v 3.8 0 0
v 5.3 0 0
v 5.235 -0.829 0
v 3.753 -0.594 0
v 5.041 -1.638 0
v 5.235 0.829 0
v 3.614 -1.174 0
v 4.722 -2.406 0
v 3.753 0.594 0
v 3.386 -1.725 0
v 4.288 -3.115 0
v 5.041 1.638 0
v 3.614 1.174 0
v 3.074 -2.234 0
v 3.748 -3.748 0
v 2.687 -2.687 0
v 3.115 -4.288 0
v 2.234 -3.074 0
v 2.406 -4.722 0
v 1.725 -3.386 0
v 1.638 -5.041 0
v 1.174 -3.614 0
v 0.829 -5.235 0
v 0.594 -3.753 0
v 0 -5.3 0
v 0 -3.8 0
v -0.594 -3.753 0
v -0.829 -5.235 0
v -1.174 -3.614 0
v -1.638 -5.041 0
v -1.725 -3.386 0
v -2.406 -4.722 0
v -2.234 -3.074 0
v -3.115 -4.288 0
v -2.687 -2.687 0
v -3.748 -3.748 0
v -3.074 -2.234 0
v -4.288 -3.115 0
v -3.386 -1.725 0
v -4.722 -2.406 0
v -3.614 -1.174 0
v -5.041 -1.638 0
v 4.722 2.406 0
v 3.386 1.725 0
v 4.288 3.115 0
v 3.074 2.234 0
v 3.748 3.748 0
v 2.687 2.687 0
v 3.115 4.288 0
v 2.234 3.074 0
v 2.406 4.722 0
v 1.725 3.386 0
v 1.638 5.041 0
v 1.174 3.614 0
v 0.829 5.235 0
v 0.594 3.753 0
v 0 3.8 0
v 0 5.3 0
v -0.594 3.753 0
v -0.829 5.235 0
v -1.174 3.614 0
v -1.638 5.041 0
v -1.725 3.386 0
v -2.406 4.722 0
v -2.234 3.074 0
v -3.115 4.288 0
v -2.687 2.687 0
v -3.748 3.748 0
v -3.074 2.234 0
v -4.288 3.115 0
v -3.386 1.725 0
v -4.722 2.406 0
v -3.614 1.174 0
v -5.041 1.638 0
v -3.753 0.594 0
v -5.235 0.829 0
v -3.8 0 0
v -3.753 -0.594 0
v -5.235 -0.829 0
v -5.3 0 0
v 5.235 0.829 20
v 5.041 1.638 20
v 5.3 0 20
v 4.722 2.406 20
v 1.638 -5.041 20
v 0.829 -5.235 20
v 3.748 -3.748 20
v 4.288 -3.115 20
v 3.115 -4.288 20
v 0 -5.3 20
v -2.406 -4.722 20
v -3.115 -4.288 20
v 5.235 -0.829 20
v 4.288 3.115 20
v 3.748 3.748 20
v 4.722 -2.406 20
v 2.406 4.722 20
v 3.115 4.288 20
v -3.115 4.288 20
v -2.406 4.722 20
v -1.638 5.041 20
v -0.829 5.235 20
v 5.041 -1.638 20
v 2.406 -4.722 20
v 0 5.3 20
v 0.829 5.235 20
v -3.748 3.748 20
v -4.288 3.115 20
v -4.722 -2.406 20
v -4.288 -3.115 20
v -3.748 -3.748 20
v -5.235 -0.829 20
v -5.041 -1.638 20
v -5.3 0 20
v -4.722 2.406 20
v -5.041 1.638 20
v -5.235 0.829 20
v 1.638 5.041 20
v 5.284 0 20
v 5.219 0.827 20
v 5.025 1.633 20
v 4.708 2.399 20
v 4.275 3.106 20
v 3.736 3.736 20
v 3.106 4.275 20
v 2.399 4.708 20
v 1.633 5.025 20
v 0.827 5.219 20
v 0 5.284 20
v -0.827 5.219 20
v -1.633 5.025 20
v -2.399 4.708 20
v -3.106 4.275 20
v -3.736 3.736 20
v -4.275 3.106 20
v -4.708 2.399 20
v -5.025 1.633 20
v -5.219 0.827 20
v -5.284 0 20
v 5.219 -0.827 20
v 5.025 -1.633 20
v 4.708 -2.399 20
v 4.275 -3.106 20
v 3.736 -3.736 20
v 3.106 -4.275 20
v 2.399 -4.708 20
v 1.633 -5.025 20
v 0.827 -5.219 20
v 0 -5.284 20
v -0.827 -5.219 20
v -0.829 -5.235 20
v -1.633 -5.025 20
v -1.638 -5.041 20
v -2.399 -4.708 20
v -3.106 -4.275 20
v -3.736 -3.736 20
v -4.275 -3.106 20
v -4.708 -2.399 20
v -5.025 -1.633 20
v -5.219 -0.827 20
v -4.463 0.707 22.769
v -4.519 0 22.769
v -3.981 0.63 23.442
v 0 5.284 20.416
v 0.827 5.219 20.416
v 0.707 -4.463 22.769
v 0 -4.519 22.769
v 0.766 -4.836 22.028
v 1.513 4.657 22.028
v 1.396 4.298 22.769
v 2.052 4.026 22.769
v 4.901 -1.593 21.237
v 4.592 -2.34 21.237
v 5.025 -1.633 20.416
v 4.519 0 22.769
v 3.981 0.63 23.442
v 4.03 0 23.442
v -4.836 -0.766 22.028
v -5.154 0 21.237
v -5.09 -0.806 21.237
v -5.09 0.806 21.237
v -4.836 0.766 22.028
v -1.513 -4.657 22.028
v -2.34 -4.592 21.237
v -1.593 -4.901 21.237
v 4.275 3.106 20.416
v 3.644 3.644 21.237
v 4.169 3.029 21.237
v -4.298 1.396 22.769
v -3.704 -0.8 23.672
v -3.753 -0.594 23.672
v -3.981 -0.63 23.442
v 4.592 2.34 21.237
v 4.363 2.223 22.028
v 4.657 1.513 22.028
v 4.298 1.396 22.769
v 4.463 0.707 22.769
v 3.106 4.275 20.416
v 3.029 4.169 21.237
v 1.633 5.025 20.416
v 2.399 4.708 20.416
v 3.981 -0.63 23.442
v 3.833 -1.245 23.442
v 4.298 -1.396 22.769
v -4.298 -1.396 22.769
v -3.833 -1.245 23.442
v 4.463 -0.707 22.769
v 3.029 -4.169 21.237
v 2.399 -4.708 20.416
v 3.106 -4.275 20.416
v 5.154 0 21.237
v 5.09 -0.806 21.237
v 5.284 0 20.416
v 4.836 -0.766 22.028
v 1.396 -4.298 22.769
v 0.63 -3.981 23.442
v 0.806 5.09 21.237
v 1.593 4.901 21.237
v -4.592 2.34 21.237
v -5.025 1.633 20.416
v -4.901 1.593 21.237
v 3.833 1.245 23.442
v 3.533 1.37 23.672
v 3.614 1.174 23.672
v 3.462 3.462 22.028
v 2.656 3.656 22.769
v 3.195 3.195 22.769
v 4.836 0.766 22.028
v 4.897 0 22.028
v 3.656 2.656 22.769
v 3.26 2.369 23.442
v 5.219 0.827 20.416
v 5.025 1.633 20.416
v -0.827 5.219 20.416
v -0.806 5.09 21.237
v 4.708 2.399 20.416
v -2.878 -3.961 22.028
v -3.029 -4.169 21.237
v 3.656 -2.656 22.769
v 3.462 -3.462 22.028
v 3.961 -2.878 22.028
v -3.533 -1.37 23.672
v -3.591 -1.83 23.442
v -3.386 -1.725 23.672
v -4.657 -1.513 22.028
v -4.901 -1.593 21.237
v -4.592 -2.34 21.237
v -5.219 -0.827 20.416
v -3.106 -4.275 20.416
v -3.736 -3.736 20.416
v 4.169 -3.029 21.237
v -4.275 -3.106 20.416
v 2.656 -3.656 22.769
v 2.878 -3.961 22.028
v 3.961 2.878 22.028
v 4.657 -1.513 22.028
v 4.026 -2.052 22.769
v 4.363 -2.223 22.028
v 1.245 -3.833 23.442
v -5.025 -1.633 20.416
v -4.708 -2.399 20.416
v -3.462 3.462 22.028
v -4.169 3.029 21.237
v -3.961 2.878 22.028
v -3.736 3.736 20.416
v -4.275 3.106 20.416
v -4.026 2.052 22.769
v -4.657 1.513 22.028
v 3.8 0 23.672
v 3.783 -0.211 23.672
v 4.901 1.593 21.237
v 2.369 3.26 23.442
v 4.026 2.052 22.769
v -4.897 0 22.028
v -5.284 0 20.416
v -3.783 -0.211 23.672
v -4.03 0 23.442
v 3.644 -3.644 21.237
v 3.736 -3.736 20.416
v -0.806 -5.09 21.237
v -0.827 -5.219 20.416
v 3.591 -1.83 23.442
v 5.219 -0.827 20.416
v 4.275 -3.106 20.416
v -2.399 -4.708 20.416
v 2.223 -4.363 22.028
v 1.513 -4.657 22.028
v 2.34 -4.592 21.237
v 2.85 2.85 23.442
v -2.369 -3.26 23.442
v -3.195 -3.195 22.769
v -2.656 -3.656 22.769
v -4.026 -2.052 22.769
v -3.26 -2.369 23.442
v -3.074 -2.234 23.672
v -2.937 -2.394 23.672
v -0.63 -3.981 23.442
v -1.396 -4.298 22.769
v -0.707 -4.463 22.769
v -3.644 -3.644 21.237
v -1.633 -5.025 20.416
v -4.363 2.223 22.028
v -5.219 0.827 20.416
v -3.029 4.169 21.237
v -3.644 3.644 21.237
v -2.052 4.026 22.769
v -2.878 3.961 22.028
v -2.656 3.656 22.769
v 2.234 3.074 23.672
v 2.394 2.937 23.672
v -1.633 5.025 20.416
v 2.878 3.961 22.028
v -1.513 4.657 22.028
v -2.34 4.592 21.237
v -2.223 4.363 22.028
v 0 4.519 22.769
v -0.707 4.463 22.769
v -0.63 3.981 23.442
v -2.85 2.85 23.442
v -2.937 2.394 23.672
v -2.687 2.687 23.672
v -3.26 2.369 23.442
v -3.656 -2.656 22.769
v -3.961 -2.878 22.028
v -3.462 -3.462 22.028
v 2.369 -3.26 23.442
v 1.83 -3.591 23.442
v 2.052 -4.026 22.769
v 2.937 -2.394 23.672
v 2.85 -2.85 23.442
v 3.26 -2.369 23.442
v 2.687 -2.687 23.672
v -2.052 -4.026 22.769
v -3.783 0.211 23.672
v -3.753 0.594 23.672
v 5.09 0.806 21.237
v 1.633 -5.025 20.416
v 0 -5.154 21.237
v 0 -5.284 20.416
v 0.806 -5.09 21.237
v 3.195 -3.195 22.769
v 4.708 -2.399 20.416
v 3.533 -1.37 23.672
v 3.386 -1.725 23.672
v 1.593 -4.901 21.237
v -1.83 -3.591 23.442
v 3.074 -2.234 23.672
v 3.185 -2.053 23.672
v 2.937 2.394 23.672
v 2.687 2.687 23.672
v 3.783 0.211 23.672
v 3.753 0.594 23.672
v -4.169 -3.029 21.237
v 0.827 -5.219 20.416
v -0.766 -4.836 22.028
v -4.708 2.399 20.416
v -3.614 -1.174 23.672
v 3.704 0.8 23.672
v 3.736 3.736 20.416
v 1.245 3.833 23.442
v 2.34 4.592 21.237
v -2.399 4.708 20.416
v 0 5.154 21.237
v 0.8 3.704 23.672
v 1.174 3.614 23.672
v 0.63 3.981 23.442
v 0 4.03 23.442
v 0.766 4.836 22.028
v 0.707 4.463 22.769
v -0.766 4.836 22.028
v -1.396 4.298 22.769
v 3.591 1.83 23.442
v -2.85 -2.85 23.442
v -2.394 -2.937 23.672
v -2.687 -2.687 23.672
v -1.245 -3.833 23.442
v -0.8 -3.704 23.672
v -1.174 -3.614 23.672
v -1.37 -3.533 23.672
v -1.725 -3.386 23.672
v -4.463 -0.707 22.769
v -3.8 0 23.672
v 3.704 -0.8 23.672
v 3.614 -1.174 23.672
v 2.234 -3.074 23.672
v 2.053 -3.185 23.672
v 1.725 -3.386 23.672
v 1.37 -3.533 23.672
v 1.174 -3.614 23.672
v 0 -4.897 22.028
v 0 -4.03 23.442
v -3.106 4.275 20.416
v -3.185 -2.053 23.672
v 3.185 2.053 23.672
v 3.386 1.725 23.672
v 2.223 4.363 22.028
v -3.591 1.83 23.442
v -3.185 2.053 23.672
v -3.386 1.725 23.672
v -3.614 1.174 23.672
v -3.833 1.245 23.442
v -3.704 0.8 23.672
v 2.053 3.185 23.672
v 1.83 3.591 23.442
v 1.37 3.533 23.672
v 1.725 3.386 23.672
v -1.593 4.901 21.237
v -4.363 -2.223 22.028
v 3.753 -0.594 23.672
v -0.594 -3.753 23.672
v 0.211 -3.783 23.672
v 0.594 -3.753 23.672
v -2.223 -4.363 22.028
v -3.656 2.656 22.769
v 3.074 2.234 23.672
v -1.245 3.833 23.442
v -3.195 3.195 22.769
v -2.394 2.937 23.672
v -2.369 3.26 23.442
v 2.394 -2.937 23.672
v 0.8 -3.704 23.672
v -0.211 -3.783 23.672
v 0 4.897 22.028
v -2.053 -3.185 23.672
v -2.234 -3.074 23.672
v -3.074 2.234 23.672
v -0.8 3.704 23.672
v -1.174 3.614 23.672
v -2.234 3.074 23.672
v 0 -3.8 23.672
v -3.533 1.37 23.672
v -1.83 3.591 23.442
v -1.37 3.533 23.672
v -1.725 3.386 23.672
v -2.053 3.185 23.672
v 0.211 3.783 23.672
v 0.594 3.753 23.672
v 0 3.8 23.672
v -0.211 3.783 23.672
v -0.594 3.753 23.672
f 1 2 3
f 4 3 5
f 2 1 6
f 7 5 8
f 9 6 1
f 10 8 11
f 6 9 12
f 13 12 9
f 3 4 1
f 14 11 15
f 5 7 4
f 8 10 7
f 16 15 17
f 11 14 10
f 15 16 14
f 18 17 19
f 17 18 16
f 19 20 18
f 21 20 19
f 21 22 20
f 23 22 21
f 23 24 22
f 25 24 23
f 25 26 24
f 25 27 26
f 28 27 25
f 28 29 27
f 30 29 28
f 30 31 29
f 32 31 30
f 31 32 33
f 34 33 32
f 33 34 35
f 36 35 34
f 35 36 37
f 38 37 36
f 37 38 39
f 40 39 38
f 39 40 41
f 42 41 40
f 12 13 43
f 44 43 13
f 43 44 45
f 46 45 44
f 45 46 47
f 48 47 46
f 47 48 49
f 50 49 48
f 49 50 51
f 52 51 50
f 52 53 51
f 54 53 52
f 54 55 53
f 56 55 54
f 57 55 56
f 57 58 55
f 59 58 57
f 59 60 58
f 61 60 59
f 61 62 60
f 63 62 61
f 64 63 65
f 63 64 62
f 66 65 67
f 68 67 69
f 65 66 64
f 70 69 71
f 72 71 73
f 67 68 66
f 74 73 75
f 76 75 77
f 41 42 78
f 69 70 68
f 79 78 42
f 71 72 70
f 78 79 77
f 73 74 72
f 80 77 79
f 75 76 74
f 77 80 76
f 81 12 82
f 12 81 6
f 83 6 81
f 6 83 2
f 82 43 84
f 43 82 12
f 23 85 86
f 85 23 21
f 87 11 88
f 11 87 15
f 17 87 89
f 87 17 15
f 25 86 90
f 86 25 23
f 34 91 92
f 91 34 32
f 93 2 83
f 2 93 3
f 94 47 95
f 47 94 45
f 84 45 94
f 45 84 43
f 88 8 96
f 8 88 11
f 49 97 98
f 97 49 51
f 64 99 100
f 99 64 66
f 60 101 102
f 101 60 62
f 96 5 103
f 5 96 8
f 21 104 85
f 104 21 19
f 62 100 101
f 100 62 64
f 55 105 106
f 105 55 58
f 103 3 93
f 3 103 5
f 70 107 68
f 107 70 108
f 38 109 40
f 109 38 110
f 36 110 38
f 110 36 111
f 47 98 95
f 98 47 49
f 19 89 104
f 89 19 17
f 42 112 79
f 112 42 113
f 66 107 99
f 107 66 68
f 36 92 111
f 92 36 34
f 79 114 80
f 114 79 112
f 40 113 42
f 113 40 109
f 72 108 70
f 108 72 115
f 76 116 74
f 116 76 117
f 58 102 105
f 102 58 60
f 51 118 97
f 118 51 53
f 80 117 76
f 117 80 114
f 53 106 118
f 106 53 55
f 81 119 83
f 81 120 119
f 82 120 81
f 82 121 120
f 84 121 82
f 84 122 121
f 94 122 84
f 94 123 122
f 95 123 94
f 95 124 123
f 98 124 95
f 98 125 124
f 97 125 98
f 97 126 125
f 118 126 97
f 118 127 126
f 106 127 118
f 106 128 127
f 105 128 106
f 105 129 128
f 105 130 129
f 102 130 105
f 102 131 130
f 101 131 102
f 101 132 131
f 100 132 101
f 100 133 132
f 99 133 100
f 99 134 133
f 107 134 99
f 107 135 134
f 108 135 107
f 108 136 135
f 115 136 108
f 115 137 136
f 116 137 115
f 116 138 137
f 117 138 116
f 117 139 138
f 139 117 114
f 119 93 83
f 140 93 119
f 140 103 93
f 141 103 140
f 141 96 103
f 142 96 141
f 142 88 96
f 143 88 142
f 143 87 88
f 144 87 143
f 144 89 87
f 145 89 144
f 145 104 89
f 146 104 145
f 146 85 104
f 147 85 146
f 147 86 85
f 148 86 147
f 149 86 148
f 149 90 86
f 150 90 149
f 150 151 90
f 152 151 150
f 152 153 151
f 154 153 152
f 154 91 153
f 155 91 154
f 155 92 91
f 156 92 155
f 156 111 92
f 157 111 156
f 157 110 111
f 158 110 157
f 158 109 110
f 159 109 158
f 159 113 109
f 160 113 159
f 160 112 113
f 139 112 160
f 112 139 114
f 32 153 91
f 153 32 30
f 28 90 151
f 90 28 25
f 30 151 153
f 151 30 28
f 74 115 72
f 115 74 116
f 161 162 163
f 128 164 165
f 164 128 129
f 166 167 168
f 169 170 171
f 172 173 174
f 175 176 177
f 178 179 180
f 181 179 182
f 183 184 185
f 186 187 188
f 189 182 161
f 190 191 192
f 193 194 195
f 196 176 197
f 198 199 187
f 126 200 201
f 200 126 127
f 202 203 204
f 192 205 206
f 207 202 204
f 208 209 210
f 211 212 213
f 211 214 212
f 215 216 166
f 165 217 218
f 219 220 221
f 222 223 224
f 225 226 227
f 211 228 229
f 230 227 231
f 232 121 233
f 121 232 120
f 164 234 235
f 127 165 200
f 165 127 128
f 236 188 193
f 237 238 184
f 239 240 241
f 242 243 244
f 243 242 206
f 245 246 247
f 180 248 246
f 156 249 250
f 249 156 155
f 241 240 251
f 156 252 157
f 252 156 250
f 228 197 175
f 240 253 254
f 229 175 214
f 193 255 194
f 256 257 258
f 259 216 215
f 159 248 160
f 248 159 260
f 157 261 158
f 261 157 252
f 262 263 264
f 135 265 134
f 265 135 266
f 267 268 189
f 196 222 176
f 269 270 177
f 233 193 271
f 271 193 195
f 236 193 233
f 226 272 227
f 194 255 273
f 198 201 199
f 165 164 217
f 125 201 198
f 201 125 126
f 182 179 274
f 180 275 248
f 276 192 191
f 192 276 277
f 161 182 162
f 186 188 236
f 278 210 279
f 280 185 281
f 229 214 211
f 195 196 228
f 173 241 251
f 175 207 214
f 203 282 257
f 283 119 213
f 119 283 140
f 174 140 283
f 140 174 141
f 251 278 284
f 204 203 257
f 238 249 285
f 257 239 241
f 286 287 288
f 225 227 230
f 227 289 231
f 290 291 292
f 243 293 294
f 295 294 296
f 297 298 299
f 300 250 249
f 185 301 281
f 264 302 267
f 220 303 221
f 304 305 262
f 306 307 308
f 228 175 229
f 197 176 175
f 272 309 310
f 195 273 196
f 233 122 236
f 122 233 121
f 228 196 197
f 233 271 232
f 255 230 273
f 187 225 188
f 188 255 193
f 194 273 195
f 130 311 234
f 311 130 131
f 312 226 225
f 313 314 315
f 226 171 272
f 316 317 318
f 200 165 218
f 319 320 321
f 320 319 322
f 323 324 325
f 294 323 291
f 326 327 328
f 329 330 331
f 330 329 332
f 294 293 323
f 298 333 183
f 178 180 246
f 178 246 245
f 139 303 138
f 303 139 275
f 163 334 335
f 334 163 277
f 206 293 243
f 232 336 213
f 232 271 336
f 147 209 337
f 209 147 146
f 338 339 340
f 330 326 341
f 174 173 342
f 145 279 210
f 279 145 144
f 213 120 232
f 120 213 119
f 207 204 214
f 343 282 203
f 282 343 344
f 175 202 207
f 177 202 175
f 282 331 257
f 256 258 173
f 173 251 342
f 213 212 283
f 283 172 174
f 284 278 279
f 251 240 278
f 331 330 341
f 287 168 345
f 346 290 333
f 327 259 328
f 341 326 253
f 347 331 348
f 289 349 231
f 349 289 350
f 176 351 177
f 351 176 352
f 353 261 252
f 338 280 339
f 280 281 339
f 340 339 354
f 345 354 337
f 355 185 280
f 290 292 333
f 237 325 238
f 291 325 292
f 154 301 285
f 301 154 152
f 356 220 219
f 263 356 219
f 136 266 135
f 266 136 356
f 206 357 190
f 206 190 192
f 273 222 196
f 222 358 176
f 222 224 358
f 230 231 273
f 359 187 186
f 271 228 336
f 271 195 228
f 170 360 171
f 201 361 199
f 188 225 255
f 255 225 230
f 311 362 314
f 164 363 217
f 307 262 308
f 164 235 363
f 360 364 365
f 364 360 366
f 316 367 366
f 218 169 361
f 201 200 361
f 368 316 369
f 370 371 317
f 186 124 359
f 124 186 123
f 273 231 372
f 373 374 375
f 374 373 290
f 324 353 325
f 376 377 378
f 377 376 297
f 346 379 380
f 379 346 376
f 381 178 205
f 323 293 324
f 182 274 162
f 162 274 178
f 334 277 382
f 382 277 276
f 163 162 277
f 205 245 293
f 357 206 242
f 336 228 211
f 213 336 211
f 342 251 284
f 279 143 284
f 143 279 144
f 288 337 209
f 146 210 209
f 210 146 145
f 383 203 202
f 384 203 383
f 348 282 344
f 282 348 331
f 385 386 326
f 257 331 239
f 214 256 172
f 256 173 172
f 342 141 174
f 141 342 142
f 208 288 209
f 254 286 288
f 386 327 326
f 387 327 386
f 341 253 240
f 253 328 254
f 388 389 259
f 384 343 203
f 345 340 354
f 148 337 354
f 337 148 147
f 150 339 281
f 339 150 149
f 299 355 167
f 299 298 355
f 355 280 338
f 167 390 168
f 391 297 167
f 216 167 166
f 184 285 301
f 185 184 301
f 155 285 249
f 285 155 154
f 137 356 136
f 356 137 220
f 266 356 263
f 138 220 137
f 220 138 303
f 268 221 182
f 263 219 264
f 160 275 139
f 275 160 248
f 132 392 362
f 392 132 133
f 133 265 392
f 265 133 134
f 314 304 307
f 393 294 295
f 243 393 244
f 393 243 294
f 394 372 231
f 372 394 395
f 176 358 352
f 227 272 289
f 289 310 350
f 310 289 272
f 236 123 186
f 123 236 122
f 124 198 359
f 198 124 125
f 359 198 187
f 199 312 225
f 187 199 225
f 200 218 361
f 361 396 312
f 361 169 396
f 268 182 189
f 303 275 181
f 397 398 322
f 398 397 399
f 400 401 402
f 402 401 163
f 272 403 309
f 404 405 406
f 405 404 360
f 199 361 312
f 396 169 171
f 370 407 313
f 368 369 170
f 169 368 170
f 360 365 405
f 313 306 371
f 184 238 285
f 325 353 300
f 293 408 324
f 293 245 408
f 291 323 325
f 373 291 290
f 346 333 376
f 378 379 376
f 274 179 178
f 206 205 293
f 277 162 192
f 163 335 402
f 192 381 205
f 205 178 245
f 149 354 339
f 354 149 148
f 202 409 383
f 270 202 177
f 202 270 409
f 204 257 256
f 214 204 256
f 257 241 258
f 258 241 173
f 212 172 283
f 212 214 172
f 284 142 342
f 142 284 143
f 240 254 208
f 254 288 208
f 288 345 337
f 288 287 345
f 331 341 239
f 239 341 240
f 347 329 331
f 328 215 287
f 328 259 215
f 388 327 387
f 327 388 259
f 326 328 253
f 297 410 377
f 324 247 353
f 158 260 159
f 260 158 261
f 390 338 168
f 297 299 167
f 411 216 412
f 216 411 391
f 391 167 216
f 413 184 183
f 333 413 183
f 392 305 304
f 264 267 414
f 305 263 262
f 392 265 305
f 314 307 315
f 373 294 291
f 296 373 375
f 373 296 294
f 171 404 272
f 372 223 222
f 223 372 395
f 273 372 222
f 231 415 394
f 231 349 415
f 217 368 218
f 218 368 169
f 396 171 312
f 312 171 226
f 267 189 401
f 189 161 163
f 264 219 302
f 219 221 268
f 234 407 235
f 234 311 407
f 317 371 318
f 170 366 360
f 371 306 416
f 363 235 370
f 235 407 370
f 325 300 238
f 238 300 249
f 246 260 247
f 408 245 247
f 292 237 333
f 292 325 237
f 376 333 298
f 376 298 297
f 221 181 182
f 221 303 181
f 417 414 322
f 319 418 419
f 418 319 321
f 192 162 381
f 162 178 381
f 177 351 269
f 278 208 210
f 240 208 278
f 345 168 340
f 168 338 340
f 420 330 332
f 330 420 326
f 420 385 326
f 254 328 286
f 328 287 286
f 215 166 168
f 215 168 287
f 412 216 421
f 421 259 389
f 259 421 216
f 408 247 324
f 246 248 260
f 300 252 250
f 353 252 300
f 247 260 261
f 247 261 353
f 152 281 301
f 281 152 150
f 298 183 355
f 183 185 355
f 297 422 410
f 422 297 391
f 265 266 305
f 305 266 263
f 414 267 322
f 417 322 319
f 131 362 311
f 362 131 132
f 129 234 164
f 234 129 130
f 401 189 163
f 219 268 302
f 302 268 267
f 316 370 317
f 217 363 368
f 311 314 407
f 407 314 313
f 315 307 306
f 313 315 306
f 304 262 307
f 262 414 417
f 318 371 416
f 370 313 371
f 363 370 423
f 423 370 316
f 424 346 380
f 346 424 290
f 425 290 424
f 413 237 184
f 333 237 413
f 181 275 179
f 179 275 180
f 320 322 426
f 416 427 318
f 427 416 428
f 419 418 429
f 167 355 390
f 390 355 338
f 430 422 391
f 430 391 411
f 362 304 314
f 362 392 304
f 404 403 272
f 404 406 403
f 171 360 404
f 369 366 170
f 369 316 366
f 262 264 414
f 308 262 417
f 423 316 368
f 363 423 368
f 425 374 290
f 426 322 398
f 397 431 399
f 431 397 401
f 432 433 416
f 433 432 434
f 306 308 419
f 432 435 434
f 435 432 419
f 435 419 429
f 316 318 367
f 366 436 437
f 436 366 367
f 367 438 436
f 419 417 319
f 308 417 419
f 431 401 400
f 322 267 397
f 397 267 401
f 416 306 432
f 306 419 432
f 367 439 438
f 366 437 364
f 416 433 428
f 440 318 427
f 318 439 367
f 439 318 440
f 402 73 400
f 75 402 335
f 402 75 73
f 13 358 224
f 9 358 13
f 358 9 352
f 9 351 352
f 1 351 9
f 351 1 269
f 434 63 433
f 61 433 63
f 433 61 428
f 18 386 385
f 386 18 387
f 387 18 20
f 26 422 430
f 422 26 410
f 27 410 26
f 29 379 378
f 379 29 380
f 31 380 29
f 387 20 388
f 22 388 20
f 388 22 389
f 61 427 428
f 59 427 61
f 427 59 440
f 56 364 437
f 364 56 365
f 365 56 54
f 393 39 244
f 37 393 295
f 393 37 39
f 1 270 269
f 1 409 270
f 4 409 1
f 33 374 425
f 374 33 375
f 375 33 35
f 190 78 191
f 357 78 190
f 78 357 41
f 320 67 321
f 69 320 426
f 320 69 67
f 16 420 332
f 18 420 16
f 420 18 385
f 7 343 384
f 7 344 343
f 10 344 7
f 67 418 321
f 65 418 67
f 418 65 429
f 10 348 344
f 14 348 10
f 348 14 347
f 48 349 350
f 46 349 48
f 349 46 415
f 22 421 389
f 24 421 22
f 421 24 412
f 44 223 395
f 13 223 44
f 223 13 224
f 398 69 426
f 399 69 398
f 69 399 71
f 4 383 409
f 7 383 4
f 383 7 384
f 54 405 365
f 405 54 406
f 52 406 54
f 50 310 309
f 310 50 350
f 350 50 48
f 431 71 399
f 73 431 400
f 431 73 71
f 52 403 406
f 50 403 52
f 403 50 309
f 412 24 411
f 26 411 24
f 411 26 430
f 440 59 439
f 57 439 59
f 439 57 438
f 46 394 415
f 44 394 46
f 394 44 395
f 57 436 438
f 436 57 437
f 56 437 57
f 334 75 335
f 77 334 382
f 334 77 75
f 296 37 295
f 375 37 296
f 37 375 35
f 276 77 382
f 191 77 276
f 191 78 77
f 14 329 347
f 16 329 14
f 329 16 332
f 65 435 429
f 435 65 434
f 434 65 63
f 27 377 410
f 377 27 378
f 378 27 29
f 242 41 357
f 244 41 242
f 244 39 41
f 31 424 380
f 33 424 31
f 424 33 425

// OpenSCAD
// 10.8

$fn = 40;

tol = 0.1;
d1 = 10.7;
d2 = 7.5;
l=20;

difference() {
    union() {
        cylinder(d=d1-tol, h=l);

        translate([0,0,l]) {
            sphere(d=d1-tol);
        }
    }

    cylinder(d=d2+tol,h=d1+l);
}
